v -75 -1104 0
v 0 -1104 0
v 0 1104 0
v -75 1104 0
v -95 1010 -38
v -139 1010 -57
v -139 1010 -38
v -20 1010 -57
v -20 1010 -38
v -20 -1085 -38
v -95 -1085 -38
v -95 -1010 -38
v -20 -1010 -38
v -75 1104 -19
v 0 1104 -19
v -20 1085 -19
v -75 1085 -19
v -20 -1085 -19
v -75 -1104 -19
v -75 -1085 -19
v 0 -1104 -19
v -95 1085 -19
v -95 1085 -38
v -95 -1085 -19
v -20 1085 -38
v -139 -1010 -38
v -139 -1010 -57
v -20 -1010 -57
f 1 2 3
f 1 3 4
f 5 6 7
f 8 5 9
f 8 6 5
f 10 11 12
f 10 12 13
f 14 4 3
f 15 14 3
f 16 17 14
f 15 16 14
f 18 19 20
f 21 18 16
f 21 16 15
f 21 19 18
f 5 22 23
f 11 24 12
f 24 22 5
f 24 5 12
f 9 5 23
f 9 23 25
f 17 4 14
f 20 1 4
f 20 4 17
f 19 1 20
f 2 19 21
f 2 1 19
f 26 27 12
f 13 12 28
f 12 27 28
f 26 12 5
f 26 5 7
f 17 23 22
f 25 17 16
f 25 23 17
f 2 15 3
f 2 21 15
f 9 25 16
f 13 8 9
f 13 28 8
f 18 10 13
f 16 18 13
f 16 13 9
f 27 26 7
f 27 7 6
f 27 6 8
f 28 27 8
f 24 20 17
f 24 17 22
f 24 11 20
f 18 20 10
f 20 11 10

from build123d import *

# Parameters (mm, degrees)
F1_DEPTH = 1104
F2_W     = 193.684367
F2_H     = 94
F2_W_2   = 206.995809
F3_DEPTH = 19
F4_W     = 75
F4_H     = 19
F5_DEPTH = 19


with BuildPart() as f1:
    # F0 (on Front) → F1 (new body, symmetric)
    with BuildSketch(Plane.XZ):
        Polygon((0, -19), (0, 0), (-75, 0), (-75, -19), (-95, -19), (-95, -38), (-139, -38), (-139, -57), (-20, -57), (-20, -19), align=None)
    extrude(amount=F1_DEPTH, both=True)

    # F2 (on face) → F3 (cut)
    with BuildSketch(Plane(origin=(0, 0, -57), x_dir=(1, 0, 0), z_dir=(0, 0, -1))):
        with Locations((-42.157817, 1057)):
            Rectangle(F2_W, F2_H)
        with Locations((-35.502096, -1057)):
            Rectangle(F2_W_2, F2_H)
    extrude(amount=-F3_DEPTH, mode=Mode.SUBTRACT)

    # F4 (on face) → F5 (cut)
    with BuildSketch(Plane(origin=(0, 0, -38), x_dir=(1, 0, 0), z_dir=(0, 0, -1))):
        with Locations((-57.5, 1094.5)):
            Rectangle(F4_W, F4_H)
        with Locations((-57.5, -1094.5)):
            Rectangle(F4_W, F4_H)
    extrude(amount=-F5_DEPTH, mode=Mode.SUBTRACT)


solid = f1.part
